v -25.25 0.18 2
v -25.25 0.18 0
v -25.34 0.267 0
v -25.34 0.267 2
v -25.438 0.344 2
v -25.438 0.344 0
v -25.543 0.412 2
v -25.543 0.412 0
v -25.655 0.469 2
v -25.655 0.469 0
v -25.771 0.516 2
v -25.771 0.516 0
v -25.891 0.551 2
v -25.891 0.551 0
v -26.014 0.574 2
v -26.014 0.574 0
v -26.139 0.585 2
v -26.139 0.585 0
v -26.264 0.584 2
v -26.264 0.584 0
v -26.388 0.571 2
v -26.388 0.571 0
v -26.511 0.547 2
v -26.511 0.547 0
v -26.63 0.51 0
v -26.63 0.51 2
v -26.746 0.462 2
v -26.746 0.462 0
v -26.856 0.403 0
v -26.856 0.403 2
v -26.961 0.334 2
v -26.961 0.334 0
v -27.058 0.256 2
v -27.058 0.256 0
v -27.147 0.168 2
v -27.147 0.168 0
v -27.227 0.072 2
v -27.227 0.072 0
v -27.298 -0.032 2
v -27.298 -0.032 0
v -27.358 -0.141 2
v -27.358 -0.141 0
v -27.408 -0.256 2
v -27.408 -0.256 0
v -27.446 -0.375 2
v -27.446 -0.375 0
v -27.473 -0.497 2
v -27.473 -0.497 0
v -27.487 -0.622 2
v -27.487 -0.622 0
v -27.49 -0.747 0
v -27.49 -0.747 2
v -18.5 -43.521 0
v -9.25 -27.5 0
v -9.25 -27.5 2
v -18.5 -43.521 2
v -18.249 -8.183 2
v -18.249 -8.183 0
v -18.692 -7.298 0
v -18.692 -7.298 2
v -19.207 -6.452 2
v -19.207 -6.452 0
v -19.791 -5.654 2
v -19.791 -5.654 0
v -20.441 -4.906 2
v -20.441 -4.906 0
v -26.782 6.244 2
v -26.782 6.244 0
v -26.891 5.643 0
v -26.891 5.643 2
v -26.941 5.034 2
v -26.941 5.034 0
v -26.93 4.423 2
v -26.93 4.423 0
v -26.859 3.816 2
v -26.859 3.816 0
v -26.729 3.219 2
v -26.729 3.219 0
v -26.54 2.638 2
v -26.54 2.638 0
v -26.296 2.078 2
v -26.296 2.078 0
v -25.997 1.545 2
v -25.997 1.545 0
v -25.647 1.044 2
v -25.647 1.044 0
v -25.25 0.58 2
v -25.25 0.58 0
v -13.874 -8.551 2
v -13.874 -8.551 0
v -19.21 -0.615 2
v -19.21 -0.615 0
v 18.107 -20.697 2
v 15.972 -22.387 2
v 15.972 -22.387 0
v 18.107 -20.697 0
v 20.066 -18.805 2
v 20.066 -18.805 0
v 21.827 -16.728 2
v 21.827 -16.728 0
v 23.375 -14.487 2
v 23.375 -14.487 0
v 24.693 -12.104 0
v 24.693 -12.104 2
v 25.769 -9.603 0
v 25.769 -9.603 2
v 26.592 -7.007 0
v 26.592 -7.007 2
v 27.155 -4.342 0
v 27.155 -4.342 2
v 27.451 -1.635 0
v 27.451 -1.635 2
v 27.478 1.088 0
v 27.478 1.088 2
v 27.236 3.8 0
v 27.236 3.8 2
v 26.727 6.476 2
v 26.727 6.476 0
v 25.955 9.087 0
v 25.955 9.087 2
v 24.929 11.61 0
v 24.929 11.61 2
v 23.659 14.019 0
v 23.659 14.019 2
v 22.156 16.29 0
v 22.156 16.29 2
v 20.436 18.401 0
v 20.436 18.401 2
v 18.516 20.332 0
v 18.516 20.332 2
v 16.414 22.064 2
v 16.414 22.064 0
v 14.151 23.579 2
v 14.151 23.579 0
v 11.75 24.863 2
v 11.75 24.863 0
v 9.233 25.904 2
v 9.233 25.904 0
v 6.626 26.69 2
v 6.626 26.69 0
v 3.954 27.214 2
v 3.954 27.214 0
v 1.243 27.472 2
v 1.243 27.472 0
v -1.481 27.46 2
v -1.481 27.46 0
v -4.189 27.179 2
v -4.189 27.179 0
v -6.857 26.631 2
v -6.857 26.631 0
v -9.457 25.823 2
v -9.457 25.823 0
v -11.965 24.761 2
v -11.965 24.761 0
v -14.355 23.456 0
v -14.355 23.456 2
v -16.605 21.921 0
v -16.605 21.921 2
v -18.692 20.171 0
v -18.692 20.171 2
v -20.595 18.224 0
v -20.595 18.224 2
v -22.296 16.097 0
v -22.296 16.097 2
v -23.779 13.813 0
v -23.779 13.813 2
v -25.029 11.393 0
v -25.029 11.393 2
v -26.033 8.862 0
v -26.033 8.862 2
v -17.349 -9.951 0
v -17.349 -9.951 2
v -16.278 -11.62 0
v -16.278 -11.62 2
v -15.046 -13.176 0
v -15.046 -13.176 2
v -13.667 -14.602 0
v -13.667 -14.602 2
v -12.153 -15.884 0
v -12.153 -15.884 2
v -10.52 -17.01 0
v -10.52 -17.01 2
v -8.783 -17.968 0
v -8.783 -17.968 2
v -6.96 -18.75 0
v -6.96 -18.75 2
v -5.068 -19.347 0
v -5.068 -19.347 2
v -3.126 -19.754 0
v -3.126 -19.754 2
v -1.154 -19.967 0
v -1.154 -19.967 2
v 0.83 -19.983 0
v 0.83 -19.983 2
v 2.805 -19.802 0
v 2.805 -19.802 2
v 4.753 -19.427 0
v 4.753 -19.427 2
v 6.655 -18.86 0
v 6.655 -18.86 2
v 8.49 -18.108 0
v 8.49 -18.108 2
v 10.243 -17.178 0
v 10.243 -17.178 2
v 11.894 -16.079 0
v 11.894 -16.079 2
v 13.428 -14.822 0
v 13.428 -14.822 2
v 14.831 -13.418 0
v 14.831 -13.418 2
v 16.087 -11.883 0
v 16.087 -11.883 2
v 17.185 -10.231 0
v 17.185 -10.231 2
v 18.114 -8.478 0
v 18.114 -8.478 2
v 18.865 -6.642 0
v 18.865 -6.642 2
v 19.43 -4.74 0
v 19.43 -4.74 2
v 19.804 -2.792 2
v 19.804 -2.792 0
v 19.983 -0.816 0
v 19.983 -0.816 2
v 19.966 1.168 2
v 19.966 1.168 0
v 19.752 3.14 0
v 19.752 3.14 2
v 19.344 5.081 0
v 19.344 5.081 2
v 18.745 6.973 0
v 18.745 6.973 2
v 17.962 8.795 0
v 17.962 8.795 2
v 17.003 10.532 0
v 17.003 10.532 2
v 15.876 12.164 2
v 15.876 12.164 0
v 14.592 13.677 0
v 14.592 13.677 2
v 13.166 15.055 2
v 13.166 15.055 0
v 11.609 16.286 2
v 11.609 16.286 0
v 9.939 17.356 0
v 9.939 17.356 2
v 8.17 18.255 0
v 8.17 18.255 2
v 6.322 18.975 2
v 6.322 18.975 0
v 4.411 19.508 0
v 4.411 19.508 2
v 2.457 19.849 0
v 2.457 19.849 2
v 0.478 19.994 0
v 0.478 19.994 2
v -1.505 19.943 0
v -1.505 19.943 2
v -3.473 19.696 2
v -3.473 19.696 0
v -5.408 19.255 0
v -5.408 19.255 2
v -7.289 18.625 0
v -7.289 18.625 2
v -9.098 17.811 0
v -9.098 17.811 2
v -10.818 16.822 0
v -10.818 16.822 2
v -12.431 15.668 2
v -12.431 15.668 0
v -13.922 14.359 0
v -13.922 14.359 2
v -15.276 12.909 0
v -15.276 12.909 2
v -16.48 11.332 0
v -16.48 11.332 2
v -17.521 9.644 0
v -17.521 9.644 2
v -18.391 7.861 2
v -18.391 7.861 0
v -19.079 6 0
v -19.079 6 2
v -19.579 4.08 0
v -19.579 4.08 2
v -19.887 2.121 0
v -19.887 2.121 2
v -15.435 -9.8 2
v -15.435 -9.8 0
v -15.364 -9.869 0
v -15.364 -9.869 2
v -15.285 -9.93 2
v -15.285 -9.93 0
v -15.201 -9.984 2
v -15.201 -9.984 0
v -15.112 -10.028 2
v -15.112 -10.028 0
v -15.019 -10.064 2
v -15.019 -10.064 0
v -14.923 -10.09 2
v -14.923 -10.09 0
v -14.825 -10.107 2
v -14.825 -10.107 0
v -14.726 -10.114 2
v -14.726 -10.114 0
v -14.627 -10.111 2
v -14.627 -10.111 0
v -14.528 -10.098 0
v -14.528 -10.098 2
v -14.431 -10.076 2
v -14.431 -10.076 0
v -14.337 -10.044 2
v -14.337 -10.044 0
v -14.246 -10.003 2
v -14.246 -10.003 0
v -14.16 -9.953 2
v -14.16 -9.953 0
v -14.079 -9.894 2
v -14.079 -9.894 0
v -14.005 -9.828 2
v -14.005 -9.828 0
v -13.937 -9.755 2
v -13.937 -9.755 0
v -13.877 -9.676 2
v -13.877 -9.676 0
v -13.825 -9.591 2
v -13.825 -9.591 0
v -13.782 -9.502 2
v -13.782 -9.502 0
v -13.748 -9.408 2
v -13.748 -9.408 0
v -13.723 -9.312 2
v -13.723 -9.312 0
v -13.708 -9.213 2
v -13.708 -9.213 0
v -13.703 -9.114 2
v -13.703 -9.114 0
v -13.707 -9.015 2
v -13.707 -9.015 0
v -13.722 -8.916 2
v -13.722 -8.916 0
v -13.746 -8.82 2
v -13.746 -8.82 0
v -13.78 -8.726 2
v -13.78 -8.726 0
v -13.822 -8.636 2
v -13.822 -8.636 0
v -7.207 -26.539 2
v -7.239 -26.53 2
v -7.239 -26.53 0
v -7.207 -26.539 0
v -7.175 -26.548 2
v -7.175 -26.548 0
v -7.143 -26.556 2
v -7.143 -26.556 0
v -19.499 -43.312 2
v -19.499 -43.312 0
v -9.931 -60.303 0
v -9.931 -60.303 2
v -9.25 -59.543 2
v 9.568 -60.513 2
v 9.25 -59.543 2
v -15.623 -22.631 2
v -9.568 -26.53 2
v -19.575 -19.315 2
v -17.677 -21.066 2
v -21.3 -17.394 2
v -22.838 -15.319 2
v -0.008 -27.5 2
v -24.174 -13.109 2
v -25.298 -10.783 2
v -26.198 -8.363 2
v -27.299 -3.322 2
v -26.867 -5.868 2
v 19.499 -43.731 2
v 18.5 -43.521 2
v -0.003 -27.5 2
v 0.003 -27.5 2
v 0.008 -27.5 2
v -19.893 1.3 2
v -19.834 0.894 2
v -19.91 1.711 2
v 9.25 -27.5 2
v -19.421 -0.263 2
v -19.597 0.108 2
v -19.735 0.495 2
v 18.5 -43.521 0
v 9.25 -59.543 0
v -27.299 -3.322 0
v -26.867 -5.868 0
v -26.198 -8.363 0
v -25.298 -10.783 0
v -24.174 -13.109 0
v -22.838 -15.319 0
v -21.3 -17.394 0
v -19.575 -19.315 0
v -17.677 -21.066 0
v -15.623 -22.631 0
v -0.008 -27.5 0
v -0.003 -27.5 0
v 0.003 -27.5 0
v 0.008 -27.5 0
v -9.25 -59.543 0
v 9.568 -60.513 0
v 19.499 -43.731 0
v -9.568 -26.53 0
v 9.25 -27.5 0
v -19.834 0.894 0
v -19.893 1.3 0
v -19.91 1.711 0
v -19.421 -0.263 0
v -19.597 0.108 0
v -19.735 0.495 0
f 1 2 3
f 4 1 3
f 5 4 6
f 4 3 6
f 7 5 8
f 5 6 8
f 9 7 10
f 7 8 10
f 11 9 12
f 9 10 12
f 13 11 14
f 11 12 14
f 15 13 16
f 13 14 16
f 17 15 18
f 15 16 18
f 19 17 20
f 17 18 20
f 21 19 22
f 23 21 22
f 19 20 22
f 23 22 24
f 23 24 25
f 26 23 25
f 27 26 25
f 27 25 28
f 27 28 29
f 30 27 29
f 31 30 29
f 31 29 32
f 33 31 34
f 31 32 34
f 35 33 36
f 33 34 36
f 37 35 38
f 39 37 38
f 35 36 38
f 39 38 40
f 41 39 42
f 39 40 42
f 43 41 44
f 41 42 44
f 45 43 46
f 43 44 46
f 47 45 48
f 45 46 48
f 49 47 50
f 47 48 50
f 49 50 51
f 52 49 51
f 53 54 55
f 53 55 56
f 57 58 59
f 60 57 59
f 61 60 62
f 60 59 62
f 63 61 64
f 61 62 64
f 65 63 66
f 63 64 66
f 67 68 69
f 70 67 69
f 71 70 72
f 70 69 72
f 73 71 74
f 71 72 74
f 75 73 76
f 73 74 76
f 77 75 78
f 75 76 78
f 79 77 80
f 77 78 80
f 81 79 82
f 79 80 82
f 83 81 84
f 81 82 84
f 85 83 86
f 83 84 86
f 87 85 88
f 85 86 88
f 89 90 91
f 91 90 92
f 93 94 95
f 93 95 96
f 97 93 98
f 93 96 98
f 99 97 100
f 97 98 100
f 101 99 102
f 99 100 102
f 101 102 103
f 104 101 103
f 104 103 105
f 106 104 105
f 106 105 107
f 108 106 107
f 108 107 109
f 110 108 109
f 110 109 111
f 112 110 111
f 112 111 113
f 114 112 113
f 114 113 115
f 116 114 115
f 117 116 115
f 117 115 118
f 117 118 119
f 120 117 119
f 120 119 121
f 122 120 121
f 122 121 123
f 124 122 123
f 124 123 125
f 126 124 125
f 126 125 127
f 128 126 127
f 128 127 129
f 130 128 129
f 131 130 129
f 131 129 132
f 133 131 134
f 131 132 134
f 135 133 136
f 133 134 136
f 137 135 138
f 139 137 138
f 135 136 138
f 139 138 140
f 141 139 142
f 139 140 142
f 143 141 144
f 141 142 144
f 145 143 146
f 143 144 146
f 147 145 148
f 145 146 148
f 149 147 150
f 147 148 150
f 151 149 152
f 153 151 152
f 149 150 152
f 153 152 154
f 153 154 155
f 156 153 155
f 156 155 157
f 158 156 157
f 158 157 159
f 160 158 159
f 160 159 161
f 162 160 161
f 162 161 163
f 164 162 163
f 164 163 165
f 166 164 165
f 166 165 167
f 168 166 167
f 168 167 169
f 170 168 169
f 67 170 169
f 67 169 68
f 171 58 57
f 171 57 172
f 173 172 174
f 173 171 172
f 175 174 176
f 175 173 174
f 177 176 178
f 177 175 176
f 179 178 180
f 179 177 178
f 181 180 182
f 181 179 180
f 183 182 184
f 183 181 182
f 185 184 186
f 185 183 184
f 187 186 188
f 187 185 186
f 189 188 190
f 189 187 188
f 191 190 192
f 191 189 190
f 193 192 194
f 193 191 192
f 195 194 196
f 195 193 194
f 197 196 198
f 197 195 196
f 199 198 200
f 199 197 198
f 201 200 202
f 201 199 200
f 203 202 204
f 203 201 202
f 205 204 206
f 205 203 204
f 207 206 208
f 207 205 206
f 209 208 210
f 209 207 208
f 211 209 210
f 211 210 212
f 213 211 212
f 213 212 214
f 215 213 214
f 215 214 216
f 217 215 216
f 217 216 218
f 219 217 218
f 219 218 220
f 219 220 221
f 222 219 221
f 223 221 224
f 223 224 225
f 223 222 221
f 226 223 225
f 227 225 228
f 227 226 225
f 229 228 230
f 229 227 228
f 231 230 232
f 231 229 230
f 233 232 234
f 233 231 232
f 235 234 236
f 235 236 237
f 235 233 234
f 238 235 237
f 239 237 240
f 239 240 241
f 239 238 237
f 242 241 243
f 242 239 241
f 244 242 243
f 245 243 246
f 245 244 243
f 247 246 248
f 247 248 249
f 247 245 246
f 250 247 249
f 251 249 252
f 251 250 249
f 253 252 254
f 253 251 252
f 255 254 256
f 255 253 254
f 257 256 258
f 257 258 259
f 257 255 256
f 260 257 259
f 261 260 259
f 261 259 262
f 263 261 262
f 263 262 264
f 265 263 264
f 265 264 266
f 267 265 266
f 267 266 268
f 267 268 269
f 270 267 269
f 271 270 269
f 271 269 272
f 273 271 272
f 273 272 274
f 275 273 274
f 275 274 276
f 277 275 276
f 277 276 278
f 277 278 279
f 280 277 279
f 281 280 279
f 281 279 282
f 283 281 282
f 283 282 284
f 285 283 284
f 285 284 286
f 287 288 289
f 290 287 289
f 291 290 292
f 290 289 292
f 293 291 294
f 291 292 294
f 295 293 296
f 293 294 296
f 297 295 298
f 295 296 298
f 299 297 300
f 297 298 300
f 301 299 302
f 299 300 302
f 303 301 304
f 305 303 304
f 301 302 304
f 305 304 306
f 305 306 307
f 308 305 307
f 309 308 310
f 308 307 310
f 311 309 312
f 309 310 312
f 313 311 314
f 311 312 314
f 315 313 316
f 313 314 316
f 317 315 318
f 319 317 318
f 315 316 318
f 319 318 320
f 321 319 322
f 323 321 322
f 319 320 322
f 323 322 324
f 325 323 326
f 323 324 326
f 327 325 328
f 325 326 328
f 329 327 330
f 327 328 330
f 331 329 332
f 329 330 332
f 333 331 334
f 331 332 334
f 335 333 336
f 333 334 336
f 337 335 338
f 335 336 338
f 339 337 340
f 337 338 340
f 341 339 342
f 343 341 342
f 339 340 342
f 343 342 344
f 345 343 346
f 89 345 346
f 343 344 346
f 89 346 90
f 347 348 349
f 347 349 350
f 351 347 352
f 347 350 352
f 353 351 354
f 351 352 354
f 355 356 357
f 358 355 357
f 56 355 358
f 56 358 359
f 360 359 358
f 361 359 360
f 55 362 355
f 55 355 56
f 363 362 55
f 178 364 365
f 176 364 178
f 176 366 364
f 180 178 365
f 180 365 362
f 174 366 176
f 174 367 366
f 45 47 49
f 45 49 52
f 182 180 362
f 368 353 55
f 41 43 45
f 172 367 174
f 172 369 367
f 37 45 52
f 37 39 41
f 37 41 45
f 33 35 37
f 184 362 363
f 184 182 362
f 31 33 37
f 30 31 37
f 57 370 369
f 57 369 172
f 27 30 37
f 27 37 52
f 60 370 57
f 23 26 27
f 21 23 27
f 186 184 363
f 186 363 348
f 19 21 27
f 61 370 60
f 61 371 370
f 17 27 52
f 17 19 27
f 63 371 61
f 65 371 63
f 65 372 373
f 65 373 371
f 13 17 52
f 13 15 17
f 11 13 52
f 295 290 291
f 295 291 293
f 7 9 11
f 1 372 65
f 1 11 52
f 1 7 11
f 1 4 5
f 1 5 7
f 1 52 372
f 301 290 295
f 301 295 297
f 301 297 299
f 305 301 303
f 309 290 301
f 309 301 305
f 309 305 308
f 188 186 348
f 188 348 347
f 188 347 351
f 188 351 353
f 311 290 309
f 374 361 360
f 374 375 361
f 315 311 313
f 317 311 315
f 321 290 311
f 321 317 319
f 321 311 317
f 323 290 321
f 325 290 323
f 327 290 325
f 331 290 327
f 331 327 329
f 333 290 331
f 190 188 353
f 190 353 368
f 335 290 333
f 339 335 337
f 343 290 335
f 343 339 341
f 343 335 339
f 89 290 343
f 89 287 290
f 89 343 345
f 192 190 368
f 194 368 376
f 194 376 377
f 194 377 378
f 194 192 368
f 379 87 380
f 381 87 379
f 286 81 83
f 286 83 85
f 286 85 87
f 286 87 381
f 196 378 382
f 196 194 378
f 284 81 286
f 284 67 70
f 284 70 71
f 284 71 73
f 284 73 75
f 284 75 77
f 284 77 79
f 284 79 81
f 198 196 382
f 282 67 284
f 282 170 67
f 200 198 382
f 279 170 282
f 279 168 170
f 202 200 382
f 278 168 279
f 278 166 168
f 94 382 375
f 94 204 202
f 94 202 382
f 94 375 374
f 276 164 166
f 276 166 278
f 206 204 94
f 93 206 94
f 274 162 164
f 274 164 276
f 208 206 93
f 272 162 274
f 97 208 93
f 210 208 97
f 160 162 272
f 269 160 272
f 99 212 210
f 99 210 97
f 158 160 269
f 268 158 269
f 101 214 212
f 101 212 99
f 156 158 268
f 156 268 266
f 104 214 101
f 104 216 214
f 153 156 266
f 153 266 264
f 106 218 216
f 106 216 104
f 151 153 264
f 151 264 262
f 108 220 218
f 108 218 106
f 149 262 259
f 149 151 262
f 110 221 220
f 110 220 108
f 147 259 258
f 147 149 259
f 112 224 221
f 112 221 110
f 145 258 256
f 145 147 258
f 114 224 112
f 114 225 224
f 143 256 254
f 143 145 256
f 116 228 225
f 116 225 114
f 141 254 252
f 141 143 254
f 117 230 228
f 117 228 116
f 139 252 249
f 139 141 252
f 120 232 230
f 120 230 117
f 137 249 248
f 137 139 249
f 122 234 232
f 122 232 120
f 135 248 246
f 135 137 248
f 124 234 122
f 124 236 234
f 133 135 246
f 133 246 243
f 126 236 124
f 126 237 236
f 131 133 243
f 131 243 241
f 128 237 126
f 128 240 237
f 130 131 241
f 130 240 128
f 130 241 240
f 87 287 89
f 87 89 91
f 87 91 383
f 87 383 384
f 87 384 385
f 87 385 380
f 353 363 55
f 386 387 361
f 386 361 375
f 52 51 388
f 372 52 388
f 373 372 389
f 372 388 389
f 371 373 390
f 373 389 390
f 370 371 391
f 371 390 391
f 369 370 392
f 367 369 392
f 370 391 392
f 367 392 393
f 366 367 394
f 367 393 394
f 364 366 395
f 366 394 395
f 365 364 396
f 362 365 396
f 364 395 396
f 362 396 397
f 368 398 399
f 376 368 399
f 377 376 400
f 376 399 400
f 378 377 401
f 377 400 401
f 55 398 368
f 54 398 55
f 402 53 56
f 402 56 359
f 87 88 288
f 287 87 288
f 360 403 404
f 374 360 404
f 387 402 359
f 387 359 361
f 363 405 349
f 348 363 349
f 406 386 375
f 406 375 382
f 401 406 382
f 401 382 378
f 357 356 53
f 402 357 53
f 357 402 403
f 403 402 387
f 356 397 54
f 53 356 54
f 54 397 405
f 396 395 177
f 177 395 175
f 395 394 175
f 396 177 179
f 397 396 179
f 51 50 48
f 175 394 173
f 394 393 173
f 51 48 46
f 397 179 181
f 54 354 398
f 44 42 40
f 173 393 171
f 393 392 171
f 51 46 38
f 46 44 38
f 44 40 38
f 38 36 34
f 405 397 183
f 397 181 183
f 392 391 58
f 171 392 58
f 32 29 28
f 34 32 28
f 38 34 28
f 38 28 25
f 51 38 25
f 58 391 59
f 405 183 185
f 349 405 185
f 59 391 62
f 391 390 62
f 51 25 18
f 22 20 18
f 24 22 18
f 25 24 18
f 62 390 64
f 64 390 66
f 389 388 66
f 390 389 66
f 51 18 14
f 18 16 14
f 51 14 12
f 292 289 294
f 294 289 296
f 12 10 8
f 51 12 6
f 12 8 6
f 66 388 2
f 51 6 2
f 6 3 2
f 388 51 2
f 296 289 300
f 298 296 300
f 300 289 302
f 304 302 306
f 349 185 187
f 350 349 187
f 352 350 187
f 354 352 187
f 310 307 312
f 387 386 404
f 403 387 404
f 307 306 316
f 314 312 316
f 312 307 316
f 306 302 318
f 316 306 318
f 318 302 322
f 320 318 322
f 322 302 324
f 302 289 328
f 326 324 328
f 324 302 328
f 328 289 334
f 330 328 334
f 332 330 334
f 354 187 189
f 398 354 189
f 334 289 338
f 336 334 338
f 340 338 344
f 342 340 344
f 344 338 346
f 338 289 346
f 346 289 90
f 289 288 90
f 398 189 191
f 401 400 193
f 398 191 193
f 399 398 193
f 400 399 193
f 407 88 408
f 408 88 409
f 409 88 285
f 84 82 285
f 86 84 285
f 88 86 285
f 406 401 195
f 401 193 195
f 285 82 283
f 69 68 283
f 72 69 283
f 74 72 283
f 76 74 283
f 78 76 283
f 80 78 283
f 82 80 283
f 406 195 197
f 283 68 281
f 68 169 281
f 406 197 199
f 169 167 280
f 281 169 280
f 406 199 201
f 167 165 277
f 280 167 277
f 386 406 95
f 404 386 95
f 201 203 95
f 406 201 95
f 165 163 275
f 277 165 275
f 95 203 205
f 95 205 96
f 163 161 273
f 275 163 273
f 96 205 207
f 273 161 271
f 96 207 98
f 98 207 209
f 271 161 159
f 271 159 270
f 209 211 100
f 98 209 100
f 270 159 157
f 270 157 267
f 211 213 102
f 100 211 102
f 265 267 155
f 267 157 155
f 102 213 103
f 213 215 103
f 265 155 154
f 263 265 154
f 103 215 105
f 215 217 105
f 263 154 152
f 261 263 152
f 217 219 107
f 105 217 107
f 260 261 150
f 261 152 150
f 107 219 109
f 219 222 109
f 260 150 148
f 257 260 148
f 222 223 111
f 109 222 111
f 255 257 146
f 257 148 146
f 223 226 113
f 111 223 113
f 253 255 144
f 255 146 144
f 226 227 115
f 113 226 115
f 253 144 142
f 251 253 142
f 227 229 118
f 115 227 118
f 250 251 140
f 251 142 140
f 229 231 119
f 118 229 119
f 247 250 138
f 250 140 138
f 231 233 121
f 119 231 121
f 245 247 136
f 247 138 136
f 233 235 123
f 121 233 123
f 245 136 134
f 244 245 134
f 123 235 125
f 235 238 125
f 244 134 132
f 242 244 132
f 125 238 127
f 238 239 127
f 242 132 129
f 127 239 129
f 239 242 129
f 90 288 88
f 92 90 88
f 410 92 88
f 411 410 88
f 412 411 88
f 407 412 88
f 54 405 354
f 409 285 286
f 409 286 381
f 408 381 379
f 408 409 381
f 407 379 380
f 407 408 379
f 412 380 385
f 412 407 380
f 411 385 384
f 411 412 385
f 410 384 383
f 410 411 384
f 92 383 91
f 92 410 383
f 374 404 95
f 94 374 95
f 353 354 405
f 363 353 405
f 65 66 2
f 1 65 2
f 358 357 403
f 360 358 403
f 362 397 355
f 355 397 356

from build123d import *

# Parameters (mm, degrees)
PAD_DEPTH    = 2
PAD001_DEPTH = 2
PAD002_DEPTH = 2


with BuildPart() as part:
    # Sketch → Pad (new body)
    with BuildSketch(Plane.XY):
        with BuildLine():
            ThreePointArc((-27.489858, -0.746794), (27.360019, -2.771163), (-26.781824, 6.243707))
            ThreePointArc((-26.781824, 6.243707), (-26.728683, 3.219003), (-25.249794, 0.579962))
            Line((-25.249794, 0.579962), (-15.435404, -9.800129))
            ThreePointArc((-15.435404, -9.800129), (-14.079498, -9.894335), (-13.873578, -8.55085))
            Line((-13.873578, -8.55085), (-19.209537, -0.614914))
            ThreePointArc((-19.887258, 2.120607), (-19.789586, 0.693092), (-19.209537, -0.614914))
            ThreePointArc((-18.249364, -8.182952), (19.751995, 3.139854), (-19.887258, 2.120607))
            ThreePointArc((-18.249364, -8.182952), (-19.207091, -6.452486), (-20.440588, -4.906446))
            Line((-20.440588, -4.906446), (-25.249794, 0.179962))
            ThreePointArc((-25.249794, 0.179962), (-26.688775, 0.487518), (-27.489858, -0.746794))
        make_face()
    extrude(amount=PAD_DEPTH)

    # Sketch001 → Pad001 (join)
    with BuildSketch(Plane.XY):
        Polygon((19.498872, -43.731184), (9.931054, -26.739808), (-9.567819, -26.530094), (-19.498872, -43.311756), (-9.931054, -60.303132), (9.567819, -60.512846), align=None)
        Polygon((18.5, -43.52147), (9.25, -27.5), (-9.25, -27.5), (-18.5, -43.52147), (-9.25, -59.54294), (9.25, -59.54294), align=None, mode=Mode.SUBTRACT)
    extrude(amount=PAD001_DEPTH)

    # Sketch002 → Pad002 (join)
    with BuildSketch(Plane.XY):
        Polygon((-15.619859, -22.616802), (-19.498872, -43.311756), (-9.567819, -26.530094), (-6.937376, -26.530094), align=None)
        Polygon((19.498872, -43.731184), (15.971505, -22.386626), (6.569976, -26.703659), (9.931054, -26.739808), align=None)
    extrude(amount=PAD002_DEPTH)


solid = part.part
